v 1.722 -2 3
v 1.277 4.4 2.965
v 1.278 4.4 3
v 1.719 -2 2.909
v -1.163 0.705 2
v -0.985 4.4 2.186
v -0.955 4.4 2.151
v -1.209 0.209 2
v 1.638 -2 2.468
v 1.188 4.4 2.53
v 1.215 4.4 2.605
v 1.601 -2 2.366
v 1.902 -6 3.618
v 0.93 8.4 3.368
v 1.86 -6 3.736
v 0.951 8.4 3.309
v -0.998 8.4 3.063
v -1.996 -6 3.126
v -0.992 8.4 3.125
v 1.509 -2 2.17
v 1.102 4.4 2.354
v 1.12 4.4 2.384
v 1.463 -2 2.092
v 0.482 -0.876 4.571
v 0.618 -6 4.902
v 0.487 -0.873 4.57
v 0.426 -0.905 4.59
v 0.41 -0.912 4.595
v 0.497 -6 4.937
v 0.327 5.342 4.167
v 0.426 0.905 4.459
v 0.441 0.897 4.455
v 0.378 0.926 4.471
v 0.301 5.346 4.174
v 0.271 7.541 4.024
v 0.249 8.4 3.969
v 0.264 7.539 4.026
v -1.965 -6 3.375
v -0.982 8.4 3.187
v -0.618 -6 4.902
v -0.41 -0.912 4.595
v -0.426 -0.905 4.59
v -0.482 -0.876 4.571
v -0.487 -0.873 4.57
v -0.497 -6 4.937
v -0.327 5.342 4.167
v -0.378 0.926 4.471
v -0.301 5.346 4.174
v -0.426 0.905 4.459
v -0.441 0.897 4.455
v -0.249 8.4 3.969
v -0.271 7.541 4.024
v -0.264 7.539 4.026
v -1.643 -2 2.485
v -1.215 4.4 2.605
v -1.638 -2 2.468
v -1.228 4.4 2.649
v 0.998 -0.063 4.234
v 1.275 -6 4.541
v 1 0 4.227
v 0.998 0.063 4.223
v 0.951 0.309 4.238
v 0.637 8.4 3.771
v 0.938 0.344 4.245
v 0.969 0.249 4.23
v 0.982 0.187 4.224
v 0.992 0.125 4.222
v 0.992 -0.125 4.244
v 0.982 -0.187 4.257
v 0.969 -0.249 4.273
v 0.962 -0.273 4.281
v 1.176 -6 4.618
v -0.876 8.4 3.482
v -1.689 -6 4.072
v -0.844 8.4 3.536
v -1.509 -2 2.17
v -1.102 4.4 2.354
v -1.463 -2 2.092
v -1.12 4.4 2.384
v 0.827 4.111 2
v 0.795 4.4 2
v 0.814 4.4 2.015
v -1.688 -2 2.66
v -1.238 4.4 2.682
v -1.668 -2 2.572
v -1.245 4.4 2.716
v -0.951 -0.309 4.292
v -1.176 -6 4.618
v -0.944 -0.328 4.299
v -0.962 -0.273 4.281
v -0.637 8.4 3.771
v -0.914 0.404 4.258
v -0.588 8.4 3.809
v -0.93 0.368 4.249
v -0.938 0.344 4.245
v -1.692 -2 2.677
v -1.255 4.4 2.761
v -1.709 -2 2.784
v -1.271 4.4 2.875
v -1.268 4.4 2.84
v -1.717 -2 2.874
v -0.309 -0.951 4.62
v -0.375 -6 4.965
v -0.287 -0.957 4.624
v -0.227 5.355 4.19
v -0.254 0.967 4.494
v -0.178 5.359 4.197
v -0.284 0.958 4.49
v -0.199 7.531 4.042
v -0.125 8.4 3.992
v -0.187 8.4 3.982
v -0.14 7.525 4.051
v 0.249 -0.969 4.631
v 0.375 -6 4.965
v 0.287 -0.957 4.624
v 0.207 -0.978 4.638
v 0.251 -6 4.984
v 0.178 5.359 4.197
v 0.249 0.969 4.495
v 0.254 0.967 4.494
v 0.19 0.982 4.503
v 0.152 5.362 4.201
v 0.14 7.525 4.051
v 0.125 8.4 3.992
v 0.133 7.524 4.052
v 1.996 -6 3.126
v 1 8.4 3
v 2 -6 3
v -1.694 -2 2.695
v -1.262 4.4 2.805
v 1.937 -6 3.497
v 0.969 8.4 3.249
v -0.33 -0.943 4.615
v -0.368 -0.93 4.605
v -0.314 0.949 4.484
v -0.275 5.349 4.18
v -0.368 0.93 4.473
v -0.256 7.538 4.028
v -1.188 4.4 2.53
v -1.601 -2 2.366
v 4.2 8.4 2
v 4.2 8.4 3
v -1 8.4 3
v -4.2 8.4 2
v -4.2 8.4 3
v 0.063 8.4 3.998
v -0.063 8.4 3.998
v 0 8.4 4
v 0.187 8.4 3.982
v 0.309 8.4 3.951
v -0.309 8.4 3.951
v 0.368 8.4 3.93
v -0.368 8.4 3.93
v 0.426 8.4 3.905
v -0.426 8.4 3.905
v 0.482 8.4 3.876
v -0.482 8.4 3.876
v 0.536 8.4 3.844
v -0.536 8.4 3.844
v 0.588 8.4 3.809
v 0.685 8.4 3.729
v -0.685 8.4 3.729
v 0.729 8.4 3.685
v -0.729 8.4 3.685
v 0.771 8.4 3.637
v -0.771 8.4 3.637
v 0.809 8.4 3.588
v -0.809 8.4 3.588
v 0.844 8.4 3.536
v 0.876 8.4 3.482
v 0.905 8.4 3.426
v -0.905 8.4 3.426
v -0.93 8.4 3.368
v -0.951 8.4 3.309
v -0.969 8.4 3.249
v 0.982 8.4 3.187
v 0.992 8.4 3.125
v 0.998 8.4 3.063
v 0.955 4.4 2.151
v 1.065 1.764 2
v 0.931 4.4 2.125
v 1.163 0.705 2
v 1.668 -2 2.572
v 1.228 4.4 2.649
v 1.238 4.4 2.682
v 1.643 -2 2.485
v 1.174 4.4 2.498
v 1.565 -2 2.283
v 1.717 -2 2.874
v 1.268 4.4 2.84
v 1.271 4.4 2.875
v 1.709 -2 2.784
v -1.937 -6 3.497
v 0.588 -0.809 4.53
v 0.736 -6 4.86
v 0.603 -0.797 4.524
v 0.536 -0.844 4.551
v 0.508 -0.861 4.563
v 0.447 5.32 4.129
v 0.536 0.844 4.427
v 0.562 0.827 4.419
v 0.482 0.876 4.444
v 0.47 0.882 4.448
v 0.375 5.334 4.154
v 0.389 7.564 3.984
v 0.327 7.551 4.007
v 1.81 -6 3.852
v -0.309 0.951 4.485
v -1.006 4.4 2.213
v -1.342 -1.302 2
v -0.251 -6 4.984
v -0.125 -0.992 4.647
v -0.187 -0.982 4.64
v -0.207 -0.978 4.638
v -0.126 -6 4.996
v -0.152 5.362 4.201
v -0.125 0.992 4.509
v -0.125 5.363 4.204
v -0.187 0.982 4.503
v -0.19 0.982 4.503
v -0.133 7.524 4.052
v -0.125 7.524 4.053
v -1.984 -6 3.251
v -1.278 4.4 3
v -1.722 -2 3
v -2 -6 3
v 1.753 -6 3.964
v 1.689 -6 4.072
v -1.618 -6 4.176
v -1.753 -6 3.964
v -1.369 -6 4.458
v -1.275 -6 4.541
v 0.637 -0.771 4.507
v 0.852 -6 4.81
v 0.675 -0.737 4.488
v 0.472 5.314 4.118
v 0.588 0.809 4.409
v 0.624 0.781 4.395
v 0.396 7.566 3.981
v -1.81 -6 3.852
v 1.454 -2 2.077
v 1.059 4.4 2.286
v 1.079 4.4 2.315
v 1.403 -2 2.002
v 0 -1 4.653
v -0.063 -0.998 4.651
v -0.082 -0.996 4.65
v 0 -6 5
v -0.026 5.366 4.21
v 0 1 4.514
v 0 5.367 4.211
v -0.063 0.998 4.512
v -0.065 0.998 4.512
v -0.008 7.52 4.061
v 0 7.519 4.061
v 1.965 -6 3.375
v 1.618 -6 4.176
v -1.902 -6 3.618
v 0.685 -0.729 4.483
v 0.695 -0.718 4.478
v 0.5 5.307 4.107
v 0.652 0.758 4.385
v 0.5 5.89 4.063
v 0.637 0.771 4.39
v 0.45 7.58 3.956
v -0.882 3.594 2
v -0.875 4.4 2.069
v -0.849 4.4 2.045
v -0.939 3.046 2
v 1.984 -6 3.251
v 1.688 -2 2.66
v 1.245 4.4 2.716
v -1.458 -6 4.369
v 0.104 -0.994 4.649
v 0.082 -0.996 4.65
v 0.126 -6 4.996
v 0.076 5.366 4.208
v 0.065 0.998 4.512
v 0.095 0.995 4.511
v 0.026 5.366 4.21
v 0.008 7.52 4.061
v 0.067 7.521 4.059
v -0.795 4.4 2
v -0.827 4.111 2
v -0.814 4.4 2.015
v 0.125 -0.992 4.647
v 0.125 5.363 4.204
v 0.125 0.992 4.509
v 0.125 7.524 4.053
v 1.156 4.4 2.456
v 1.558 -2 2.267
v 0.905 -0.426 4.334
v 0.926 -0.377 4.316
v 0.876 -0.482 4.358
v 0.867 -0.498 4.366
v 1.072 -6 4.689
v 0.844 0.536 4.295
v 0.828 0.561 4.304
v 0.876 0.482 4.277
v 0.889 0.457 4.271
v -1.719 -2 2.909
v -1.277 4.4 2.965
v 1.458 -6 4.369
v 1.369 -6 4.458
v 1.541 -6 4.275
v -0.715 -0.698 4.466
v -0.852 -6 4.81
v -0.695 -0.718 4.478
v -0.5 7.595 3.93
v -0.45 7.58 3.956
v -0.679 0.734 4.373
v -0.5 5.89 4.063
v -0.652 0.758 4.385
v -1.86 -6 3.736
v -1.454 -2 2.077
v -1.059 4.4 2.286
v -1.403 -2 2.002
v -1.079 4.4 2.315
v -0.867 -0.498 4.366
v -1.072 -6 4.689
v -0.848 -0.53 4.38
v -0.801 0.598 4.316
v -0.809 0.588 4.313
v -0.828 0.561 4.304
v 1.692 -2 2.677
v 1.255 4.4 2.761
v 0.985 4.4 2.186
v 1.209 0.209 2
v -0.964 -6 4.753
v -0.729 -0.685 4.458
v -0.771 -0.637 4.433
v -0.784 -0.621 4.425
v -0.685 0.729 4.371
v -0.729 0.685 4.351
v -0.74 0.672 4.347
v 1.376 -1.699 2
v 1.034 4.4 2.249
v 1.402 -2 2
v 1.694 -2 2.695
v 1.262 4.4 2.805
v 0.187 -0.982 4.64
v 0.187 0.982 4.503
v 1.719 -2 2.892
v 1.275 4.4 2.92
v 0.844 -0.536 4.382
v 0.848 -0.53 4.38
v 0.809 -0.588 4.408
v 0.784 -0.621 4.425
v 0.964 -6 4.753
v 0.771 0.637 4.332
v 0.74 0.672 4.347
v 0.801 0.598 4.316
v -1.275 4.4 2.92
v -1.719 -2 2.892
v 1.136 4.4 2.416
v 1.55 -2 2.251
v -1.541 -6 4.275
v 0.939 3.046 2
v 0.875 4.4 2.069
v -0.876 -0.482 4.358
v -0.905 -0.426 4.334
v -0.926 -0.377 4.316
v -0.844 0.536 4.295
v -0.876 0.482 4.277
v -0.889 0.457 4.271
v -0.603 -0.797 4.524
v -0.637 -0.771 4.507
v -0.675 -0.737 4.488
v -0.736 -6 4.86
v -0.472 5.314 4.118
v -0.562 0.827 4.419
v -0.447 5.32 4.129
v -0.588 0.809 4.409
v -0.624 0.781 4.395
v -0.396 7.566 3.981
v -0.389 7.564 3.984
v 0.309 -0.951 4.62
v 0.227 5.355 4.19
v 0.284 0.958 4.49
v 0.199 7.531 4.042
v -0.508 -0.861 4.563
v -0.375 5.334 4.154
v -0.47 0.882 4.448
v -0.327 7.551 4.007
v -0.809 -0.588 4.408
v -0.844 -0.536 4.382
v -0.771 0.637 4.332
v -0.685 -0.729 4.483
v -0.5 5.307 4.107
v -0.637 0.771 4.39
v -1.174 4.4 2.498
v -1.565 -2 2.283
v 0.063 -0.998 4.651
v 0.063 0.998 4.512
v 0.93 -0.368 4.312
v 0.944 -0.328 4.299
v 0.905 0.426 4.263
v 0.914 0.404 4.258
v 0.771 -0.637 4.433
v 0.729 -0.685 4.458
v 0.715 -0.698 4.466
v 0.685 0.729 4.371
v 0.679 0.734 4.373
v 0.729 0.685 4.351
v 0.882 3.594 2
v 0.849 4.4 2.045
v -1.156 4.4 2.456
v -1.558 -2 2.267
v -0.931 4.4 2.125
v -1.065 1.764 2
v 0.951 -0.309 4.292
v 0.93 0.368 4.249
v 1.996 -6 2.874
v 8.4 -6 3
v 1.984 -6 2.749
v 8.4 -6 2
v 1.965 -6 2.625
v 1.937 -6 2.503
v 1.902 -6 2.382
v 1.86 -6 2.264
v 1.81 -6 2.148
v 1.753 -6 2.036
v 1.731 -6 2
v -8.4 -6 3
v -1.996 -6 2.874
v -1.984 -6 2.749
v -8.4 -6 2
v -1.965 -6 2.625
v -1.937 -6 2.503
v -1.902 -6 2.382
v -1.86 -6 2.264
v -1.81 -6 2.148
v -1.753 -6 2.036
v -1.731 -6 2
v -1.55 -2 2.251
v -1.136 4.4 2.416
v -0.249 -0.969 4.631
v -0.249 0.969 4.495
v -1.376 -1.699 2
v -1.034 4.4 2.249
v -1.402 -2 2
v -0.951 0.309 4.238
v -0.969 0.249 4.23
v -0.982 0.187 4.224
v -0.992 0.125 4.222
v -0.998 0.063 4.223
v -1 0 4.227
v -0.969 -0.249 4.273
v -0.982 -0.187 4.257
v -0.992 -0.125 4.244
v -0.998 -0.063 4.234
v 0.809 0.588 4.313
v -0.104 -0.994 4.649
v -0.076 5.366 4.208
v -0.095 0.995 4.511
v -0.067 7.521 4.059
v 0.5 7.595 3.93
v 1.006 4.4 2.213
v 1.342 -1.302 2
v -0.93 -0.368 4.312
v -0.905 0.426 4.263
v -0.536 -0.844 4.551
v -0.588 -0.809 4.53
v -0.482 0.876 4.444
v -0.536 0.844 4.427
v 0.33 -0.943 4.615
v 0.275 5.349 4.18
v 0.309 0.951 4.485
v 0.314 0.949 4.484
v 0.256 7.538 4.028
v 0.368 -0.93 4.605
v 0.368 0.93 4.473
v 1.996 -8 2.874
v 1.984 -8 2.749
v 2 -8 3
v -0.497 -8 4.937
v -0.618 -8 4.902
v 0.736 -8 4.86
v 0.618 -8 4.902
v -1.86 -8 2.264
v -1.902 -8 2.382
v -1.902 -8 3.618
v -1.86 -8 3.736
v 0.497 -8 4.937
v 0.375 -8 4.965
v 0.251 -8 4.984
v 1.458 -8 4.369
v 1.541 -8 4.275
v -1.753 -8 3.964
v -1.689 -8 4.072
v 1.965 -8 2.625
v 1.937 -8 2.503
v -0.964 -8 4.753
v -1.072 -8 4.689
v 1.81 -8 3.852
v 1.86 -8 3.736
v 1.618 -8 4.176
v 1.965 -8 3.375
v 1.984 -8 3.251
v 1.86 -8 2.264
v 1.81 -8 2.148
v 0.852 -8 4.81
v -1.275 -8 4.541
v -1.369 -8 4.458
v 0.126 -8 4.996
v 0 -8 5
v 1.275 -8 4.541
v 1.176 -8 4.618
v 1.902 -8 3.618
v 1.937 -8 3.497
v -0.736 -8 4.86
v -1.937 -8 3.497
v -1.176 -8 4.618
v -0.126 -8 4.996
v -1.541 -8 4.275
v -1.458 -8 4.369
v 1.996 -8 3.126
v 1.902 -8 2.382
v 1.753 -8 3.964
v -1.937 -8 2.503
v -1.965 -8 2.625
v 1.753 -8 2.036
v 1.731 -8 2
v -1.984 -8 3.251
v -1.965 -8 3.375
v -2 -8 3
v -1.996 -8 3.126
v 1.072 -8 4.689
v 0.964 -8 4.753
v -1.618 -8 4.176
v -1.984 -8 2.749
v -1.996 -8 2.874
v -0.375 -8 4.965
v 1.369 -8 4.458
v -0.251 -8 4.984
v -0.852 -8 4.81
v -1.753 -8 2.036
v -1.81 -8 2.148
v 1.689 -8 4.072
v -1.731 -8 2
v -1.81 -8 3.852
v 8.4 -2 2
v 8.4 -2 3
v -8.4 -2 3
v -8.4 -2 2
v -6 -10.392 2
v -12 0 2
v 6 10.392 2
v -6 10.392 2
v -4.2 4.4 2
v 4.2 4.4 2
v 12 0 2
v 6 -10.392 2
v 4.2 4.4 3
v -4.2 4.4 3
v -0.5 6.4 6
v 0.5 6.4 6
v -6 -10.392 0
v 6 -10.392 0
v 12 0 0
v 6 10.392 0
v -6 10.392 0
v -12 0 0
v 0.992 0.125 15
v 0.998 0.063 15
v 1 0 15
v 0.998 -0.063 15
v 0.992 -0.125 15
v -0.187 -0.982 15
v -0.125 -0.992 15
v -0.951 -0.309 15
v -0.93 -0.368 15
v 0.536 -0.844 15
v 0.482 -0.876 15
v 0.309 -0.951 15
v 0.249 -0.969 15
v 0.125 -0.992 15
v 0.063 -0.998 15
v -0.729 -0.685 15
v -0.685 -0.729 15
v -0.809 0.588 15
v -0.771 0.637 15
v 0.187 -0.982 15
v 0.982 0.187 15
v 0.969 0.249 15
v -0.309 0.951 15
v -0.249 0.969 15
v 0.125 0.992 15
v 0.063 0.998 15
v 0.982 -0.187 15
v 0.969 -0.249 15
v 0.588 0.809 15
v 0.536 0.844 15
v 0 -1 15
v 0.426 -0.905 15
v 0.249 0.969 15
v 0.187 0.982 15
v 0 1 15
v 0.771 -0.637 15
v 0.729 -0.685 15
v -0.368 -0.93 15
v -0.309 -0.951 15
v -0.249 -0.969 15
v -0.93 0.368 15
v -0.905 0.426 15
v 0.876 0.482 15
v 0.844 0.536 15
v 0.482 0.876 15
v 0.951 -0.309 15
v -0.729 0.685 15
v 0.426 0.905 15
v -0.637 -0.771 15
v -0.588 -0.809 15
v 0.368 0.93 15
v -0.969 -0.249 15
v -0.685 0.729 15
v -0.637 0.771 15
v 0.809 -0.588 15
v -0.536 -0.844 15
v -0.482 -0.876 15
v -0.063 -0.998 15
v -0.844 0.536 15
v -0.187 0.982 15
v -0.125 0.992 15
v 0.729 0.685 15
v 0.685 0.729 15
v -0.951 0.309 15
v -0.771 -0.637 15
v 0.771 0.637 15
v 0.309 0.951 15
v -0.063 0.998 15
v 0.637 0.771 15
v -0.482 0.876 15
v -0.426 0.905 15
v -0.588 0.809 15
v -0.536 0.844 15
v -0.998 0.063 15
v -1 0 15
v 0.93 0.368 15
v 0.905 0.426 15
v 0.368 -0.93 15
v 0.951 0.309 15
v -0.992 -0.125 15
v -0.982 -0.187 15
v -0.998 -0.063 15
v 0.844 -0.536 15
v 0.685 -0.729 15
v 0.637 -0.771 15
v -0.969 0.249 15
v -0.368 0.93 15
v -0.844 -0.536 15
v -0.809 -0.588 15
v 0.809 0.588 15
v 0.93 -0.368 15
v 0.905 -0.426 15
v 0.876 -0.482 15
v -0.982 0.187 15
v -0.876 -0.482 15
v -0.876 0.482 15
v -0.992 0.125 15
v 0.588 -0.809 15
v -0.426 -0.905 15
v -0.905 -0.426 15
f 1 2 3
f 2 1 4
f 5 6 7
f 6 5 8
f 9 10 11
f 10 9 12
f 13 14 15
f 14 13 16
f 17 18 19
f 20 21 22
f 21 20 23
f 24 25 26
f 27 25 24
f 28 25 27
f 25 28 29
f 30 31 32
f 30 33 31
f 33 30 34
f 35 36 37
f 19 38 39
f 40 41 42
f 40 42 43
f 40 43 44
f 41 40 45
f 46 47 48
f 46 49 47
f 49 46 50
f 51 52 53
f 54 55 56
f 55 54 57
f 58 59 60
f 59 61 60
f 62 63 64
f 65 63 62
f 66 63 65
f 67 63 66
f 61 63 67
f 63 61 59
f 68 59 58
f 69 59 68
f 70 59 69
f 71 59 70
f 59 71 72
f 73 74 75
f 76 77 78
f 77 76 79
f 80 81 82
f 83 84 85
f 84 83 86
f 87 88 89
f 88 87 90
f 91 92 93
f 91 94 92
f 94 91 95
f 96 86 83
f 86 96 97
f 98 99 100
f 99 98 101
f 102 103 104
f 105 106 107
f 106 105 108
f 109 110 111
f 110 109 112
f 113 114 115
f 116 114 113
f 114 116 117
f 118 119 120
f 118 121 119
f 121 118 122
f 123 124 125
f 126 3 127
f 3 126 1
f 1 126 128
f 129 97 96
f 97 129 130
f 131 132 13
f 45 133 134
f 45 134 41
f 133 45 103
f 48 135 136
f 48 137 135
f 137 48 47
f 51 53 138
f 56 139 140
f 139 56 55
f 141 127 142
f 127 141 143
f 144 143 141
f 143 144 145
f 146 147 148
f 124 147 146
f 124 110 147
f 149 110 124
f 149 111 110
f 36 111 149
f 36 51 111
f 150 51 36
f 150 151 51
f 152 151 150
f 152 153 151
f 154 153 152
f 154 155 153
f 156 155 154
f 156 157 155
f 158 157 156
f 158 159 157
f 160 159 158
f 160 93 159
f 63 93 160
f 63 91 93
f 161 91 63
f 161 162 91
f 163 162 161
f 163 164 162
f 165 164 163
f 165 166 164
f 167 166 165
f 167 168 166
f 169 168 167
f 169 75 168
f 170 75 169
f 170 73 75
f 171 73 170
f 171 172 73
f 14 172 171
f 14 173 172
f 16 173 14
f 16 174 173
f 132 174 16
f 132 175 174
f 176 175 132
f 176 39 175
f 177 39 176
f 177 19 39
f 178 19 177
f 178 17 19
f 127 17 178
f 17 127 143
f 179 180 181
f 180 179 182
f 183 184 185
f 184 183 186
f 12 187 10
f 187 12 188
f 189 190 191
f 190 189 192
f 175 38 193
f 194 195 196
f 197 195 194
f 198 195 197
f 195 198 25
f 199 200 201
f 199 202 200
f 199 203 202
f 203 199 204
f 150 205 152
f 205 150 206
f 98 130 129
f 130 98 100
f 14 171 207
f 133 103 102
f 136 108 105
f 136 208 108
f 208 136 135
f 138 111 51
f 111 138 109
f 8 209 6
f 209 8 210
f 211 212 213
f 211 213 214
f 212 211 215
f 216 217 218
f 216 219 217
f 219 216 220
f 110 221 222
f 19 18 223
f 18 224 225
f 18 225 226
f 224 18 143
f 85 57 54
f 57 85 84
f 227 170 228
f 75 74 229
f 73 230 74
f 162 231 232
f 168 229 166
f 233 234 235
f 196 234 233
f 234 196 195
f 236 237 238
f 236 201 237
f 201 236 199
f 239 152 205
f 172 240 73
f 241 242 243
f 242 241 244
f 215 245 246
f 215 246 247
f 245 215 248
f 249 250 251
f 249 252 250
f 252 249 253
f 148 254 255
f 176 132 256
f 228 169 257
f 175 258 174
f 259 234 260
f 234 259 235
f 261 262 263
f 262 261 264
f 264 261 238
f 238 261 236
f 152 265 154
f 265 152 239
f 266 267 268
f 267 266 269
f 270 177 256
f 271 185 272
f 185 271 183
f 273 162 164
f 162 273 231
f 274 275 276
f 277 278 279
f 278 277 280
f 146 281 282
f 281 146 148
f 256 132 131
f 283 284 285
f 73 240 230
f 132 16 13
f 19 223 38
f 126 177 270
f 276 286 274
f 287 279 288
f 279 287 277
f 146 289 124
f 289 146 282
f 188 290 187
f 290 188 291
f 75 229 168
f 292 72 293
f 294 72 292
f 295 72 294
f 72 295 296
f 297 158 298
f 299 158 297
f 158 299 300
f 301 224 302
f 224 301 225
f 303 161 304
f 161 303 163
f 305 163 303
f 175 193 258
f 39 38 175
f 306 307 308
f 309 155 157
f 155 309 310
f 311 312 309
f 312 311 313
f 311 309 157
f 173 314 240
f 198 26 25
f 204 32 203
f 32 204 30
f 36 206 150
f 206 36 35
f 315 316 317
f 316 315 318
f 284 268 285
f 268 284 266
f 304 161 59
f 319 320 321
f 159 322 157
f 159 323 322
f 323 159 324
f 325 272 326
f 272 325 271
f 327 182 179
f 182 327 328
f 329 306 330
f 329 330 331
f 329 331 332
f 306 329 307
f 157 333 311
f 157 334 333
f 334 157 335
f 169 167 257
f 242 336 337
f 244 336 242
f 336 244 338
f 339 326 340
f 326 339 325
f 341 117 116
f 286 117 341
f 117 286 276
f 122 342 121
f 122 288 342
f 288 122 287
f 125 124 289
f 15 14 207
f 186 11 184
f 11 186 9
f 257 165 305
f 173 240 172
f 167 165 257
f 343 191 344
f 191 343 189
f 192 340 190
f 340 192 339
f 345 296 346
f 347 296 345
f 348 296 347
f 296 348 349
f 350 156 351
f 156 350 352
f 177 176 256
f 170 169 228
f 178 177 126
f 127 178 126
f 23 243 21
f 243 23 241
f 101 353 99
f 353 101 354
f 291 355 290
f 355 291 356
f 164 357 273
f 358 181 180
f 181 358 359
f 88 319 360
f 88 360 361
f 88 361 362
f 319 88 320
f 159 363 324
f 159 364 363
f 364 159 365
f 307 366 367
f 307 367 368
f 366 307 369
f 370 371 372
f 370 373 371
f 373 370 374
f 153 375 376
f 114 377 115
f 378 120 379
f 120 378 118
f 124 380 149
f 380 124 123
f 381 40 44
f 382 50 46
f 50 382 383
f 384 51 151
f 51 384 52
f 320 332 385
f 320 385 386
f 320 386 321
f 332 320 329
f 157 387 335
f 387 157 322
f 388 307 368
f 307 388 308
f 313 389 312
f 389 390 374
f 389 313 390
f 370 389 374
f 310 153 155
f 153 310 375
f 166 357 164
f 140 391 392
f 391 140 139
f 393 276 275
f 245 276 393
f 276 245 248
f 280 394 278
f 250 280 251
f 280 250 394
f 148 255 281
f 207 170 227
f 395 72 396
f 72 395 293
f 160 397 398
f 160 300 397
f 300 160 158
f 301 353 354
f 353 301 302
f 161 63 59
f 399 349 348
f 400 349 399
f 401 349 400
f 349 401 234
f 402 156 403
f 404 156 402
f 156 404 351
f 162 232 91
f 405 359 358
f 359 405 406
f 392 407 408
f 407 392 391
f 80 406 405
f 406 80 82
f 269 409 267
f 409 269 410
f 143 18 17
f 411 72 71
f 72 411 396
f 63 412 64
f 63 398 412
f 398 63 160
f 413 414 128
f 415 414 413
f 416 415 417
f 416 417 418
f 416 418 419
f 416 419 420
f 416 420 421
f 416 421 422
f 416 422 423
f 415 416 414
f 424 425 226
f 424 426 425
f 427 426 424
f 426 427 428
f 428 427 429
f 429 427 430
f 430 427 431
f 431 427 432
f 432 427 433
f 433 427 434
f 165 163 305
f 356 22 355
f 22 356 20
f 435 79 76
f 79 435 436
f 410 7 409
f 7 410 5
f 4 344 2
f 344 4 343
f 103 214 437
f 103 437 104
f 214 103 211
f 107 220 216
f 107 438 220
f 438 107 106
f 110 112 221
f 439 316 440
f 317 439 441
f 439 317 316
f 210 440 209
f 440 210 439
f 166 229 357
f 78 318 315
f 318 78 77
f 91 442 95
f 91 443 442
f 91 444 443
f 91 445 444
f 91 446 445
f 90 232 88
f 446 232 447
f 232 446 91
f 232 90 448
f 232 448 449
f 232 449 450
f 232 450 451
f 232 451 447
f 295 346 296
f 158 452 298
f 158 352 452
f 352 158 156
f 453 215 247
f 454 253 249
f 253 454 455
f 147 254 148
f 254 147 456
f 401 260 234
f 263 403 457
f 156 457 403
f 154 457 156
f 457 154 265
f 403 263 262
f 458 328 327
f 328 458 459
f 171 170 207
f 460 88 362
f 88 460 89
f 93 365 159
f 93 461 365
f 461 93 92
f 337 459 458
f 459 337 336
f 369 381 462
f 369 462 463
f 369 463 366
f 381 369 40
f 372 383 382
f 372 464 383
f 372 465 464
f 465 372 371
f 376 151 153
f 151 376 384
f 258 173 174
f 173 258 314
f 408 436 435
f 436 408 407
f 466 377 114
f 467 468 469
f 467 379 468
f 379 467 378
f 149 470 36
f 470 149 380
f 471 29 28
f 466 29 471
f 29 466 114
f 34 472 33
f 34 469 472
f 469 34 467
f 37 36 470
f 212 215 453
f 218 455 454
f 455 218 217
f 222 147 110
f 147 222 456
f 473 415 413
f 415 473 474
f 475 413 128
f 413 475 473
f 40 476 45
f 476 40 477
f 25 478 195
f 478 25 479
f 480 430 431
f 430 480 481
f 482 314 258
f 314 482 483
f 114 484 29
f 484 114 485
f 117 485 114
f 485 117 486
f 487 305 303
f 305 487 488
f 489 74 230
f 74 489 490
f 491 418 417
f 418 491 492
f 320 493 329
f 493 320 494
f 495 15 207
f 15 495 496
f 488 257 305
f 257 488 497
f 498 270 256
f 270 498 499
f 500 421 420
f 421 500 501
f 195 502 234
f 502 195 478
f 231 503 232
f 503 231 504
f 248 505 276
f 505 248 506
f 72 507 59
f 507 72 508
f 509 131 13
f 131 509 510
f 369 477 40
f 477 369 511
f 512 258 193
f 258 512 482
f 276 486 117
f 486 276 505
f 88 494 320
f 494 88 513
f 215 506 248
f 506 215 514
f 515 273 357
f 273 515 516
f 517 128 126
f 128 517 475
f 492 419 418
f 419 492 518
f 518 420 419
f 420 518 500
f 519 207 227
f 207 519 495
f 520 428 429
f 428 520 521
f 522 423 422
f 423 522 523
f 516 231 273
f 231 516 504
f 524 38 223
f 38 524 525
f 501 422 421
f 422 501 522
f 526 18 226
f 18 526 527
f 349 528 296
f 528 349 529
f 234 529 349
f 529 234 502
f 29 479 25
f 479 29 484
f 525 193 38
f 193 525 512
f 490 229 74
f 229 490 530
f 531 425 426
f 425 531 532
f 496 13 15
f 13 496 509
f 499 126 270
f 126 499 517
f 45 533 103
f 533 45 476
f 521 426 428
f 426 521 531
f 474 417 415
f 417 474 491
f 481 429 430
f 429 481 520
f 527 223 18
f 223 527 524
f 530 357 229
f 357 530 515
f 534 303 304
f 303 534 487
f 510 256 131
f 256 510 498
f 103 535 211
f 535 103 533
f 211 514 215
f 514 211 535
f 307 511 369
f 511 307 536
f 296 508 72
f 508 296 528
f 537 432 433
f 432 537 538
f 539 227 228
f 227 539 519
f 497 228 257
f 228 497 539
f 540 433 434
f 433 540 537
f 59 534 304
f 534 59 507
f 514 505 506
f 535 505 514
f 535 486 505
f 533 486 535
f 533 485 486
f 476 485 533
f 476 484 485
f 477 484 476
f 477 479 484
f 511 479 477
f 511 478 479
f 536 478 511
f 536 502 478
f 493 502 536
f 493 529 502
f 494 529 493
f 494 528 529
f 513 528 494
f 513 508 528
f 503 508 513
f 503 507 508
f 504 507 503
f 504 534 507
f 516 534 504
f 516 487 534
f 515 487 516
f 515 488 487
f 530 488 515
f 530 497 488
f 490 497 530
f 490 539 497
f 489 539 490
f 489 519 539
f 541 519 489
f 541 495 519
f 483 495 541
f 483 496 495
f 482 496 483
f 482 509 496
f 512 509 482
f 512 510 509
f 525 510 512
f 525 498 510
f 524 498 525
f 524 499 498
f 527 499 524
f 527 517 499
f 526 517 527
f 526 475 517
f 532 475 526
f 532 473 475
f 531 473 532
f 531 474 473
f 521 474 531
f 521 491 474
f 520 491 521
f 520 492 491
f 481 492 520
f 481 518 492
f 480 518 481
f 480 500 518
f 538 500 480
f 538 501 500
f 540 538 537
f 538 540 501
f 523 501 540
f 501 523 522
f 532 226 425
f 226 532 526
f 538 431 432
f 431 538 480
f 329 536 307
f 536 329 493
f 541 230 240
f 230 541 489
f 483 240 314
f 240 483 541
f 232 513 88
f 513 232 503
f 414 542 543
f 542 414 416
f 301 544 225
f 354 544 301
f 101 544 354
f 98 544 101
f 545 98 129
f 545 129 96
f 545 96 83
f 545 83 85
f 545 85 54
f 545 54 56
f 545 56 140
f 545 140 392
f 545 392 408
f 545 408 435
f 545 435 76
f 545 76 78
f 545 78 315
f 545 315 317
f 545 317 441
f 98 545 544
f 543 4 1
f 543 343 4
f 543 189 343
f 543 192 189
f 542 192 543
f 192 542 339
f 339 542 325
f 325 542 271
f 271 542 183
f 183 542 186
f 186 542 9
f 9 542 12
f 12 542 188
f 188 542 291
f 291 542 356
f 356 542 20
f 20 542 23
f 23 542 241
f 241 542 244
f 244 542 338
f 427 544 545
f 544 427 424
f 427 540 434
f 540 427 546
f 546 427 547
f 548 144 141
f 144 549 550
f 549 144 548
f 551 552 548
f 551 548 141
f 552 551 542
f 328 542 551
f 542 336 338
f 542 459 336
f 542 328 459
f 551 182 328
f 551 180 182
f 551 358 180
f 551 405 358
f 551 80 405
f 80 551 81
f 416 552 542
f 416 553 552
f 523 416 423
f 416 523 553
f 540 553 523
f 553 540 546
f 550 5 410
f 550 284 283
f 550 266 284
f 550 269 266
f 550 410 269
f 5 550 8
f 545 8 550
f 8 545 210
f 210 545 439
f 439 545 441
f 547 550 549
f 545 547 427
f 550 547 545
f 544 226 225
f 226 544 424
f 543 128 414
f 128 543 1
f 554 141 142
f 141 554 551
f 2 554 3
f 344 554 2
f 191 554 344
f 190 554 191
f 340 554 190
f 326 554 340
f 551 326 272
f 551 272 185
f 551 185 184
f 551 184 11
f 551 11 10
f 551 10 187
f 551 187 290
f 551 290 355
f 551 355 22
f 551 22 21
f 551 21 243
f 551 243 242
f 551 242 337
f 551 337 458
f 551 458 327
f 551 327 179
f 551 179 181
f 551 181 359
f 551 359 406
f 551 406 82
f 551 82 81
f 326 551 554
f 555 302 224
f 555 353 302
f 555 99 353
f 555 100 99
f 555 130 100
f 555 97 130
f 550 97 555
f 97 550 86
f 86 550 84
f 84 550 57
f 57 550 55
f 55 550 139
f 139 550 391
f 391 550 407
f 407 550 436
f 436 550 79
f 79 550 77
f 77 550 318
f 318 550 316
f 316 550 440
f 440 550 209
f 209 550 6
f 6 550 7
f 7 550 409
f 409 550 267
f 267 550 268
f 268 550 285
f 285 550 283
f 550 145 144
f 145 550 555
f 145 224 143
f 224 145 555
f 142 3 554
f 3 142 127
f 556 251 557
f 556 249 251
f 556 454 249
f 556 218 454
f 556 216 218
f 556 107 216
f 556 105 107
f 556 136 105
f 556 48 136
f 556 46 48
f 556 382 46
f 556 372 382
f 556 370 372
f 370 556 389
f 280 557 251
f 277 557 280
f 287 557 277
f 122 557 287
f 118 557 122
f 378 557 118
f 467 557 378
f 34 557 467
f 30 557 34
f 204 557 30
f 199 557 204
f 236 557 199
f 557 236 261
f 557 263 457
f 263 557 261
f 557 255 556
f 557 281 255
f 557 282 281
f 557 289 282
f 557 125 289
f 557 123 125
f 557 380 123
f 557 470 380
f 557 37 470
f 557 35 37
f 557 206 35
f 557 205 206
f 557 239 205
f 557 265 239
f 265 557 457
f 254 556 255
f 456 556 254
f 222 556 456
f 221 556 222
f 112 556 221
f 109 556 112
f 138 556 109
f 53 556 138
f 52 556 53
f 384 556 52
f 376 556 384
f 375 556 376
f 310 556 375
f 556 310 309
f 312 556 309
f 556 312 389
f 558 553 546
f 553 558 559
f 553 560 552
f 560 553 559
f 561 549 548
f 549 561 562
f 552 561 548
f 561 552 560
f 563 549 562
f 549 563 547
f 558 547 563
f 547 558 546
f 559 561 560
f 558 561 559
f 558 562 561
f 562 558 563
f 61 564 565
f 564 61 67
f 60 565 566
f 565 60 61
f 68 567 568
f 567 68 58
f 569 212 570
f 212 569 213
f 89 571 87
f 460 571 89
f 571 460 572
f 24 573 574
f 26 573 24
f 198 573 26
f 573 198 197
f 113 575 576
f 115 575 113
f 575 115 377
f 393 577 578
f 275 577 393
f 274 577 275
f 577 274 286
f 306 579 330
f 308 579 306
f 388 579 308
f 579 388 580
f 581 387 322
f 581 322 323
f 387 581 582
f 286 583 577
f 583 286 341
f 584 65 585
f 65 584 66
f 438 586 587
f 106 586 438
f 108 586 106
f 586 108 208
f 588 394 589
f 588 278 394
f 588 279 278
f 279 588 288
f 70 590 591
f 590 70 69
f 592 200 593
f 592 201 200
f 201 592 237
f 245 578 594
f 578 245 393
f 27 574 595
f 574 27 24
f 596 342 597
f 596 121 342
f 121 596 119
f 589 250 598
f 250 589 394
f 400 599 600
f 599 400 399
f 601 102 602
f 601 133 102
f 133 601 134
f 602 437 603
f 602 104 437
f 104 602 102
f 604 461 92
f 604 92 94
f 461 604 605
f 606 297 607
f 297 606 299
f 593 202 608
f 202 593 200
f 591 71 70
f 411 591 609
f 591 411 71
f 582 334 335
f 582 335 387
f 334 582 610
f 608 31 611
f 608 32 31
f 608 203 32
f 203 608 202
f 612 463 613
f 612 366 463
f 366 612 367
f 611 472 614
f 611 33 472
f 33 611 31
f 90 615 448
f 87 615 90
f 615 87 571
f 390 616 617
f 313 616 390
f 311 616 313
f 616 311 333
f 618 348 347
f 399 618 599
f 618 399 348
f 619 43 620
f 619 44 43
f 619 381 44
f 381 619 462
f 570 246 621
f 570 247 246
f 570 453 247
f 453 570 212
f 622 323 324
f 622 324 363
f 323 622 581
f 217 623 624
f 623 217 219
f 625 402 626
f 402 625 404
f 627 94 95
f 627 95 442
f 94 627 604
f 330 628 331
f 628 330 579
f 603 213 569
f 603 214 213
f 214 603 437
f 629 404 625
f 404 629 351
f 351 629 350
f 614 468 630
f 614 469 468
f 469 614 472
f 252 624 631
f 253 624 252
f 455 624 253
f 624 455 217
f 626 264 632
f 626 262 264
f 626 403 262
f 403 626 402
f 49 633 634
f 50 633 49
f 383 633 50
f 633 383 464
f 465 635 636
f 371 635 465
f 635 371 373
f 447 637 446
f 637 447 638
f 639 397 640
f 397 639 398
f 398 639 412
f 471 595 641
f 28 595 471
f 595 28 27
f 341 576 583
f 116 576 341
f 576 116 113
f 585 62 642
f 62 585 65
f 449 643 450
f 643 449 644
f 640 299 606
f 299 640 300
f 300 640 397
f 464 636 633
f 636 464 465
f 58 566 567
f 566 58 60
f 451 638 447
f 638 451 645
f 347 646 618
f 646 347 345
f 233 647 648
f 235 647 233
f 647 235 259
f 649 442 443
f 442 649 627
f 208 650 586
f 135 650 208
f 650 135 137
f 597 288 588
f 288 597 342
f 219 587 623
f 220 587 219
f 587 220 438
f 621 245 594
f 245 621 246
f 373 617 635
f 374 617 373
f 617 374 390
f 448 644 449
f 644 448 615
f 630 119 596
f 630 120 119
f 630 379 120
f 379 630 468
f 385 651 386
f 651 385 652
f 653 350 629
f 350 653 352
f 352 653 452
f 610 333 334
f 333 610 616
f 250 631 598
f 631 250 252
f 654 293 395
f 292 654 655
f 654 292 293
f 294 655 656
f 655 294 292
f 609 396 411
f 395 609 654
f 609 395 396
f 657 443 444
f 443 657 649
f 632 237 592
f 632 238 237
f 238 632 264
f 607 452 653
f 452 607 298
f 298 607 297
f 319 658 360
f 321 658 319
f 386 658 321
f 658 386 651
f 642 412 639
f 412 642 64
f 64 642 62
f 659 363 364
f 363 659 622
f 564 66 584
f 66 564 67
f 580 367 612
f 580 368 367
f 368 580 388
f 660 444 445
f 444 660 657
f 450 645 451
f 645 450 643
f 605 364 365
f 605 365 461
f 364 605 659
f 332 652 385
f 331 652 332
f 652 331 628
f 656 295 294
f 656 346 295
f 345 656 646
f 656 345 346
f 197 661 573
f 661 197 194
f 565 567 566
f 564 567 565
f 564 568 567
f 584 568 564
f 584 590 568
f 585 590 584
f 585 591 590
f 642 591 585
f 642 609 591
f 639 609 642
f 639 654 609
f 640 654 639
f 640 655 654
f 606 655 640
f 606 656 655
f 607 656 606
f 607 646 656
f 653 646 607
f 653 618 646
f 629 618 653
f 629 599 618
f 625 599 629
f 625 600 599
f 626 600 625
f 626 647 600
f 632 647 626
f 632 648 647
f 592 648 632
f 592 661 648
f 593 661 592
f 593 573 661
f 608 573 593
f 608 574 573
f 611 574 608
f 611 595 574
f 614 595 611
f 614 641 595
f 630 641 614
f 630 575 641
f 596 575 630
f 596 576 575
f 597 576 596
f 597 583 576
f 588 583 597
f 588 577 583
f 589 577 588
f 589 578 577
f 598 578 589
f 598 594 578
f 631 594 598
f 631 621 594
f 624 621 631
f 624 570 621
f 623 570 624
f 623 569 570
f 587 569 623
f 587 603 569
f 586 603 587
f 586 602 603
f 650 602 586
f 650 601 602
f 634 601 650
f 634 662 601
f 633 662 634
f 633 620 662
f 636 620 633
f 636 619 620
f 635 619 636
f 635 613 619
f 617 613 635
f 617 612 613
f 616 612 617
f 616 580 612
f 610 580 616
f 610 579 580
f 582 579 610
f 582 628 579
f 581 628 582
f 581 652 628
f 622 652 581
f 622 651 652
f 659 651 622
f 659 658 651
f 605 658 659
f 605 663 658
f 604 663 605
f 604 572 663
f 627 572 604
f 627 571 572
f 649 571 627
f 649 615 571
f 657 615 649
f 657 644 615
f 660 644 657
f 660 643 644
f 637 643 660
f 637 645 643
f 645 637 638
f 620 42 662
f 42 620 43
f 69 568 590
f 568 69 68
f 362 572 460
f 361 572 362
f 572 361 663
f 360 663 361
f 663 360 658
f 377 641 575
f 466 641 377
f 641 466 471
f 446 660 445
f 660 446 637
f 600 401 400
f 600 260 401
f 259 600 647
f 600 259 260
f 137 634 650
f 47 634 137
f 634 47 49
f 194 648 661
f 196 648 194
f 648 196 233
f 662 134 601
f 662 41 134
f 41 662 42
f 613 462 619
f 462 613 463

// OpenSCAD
tile_size = 12;
base_height = 2;

holder_diameter = 2;
holder_height = 15;


fusilage_diameter = 2;
fusilage_length = tile_size * 1.2;
engine_length = 2;
wingspan = tile_size * 1.4;
wing_thickness = 1;
canopy_length = tile_size / 3;

//cylinder(h=base_height, r=tile_size, $fn=6);

$fn = 100;

module aircraft() {
    translate([0, 0, -2]) {
        translate([0, 0, engine_length]) {
            cylinder(h=fusilage_length, r1=fusilage_diameter, r2=fusilage_diameter/2);
        };
        cylinder(h=engine_length, r=fusilage_diameter);
        translate([-wingspan/2, 0, engine_length]) {
            cube([wingspan, wing_thickness, canopy_length]);
        }
        translate([-wingspan/4, 0, fusilage_length - canopy_length + engine_length]) {
            cube([wingspan/2, wing_thickness, canopy_length]);
        }
        translate([-wing_thickness/2, -wing_thickness, fusilage_length]) {
            rotate([90, 180, 90]) {
                cylinder(h=wing_thickness, d=canopy_length, $fn=3);
            }
        }
    }
}

module pawn() {
    cylinder(h=base_height, r=tile_size, $fn=6);
    translate([0, -tile_size/2, base_height + fusilage_diameter/2]) {
        rotate([270, 0, 0]) {
            aircraft();
        }
    }
    cylinder(h=holder_height, d=holder_diameter);
}

pawn();
